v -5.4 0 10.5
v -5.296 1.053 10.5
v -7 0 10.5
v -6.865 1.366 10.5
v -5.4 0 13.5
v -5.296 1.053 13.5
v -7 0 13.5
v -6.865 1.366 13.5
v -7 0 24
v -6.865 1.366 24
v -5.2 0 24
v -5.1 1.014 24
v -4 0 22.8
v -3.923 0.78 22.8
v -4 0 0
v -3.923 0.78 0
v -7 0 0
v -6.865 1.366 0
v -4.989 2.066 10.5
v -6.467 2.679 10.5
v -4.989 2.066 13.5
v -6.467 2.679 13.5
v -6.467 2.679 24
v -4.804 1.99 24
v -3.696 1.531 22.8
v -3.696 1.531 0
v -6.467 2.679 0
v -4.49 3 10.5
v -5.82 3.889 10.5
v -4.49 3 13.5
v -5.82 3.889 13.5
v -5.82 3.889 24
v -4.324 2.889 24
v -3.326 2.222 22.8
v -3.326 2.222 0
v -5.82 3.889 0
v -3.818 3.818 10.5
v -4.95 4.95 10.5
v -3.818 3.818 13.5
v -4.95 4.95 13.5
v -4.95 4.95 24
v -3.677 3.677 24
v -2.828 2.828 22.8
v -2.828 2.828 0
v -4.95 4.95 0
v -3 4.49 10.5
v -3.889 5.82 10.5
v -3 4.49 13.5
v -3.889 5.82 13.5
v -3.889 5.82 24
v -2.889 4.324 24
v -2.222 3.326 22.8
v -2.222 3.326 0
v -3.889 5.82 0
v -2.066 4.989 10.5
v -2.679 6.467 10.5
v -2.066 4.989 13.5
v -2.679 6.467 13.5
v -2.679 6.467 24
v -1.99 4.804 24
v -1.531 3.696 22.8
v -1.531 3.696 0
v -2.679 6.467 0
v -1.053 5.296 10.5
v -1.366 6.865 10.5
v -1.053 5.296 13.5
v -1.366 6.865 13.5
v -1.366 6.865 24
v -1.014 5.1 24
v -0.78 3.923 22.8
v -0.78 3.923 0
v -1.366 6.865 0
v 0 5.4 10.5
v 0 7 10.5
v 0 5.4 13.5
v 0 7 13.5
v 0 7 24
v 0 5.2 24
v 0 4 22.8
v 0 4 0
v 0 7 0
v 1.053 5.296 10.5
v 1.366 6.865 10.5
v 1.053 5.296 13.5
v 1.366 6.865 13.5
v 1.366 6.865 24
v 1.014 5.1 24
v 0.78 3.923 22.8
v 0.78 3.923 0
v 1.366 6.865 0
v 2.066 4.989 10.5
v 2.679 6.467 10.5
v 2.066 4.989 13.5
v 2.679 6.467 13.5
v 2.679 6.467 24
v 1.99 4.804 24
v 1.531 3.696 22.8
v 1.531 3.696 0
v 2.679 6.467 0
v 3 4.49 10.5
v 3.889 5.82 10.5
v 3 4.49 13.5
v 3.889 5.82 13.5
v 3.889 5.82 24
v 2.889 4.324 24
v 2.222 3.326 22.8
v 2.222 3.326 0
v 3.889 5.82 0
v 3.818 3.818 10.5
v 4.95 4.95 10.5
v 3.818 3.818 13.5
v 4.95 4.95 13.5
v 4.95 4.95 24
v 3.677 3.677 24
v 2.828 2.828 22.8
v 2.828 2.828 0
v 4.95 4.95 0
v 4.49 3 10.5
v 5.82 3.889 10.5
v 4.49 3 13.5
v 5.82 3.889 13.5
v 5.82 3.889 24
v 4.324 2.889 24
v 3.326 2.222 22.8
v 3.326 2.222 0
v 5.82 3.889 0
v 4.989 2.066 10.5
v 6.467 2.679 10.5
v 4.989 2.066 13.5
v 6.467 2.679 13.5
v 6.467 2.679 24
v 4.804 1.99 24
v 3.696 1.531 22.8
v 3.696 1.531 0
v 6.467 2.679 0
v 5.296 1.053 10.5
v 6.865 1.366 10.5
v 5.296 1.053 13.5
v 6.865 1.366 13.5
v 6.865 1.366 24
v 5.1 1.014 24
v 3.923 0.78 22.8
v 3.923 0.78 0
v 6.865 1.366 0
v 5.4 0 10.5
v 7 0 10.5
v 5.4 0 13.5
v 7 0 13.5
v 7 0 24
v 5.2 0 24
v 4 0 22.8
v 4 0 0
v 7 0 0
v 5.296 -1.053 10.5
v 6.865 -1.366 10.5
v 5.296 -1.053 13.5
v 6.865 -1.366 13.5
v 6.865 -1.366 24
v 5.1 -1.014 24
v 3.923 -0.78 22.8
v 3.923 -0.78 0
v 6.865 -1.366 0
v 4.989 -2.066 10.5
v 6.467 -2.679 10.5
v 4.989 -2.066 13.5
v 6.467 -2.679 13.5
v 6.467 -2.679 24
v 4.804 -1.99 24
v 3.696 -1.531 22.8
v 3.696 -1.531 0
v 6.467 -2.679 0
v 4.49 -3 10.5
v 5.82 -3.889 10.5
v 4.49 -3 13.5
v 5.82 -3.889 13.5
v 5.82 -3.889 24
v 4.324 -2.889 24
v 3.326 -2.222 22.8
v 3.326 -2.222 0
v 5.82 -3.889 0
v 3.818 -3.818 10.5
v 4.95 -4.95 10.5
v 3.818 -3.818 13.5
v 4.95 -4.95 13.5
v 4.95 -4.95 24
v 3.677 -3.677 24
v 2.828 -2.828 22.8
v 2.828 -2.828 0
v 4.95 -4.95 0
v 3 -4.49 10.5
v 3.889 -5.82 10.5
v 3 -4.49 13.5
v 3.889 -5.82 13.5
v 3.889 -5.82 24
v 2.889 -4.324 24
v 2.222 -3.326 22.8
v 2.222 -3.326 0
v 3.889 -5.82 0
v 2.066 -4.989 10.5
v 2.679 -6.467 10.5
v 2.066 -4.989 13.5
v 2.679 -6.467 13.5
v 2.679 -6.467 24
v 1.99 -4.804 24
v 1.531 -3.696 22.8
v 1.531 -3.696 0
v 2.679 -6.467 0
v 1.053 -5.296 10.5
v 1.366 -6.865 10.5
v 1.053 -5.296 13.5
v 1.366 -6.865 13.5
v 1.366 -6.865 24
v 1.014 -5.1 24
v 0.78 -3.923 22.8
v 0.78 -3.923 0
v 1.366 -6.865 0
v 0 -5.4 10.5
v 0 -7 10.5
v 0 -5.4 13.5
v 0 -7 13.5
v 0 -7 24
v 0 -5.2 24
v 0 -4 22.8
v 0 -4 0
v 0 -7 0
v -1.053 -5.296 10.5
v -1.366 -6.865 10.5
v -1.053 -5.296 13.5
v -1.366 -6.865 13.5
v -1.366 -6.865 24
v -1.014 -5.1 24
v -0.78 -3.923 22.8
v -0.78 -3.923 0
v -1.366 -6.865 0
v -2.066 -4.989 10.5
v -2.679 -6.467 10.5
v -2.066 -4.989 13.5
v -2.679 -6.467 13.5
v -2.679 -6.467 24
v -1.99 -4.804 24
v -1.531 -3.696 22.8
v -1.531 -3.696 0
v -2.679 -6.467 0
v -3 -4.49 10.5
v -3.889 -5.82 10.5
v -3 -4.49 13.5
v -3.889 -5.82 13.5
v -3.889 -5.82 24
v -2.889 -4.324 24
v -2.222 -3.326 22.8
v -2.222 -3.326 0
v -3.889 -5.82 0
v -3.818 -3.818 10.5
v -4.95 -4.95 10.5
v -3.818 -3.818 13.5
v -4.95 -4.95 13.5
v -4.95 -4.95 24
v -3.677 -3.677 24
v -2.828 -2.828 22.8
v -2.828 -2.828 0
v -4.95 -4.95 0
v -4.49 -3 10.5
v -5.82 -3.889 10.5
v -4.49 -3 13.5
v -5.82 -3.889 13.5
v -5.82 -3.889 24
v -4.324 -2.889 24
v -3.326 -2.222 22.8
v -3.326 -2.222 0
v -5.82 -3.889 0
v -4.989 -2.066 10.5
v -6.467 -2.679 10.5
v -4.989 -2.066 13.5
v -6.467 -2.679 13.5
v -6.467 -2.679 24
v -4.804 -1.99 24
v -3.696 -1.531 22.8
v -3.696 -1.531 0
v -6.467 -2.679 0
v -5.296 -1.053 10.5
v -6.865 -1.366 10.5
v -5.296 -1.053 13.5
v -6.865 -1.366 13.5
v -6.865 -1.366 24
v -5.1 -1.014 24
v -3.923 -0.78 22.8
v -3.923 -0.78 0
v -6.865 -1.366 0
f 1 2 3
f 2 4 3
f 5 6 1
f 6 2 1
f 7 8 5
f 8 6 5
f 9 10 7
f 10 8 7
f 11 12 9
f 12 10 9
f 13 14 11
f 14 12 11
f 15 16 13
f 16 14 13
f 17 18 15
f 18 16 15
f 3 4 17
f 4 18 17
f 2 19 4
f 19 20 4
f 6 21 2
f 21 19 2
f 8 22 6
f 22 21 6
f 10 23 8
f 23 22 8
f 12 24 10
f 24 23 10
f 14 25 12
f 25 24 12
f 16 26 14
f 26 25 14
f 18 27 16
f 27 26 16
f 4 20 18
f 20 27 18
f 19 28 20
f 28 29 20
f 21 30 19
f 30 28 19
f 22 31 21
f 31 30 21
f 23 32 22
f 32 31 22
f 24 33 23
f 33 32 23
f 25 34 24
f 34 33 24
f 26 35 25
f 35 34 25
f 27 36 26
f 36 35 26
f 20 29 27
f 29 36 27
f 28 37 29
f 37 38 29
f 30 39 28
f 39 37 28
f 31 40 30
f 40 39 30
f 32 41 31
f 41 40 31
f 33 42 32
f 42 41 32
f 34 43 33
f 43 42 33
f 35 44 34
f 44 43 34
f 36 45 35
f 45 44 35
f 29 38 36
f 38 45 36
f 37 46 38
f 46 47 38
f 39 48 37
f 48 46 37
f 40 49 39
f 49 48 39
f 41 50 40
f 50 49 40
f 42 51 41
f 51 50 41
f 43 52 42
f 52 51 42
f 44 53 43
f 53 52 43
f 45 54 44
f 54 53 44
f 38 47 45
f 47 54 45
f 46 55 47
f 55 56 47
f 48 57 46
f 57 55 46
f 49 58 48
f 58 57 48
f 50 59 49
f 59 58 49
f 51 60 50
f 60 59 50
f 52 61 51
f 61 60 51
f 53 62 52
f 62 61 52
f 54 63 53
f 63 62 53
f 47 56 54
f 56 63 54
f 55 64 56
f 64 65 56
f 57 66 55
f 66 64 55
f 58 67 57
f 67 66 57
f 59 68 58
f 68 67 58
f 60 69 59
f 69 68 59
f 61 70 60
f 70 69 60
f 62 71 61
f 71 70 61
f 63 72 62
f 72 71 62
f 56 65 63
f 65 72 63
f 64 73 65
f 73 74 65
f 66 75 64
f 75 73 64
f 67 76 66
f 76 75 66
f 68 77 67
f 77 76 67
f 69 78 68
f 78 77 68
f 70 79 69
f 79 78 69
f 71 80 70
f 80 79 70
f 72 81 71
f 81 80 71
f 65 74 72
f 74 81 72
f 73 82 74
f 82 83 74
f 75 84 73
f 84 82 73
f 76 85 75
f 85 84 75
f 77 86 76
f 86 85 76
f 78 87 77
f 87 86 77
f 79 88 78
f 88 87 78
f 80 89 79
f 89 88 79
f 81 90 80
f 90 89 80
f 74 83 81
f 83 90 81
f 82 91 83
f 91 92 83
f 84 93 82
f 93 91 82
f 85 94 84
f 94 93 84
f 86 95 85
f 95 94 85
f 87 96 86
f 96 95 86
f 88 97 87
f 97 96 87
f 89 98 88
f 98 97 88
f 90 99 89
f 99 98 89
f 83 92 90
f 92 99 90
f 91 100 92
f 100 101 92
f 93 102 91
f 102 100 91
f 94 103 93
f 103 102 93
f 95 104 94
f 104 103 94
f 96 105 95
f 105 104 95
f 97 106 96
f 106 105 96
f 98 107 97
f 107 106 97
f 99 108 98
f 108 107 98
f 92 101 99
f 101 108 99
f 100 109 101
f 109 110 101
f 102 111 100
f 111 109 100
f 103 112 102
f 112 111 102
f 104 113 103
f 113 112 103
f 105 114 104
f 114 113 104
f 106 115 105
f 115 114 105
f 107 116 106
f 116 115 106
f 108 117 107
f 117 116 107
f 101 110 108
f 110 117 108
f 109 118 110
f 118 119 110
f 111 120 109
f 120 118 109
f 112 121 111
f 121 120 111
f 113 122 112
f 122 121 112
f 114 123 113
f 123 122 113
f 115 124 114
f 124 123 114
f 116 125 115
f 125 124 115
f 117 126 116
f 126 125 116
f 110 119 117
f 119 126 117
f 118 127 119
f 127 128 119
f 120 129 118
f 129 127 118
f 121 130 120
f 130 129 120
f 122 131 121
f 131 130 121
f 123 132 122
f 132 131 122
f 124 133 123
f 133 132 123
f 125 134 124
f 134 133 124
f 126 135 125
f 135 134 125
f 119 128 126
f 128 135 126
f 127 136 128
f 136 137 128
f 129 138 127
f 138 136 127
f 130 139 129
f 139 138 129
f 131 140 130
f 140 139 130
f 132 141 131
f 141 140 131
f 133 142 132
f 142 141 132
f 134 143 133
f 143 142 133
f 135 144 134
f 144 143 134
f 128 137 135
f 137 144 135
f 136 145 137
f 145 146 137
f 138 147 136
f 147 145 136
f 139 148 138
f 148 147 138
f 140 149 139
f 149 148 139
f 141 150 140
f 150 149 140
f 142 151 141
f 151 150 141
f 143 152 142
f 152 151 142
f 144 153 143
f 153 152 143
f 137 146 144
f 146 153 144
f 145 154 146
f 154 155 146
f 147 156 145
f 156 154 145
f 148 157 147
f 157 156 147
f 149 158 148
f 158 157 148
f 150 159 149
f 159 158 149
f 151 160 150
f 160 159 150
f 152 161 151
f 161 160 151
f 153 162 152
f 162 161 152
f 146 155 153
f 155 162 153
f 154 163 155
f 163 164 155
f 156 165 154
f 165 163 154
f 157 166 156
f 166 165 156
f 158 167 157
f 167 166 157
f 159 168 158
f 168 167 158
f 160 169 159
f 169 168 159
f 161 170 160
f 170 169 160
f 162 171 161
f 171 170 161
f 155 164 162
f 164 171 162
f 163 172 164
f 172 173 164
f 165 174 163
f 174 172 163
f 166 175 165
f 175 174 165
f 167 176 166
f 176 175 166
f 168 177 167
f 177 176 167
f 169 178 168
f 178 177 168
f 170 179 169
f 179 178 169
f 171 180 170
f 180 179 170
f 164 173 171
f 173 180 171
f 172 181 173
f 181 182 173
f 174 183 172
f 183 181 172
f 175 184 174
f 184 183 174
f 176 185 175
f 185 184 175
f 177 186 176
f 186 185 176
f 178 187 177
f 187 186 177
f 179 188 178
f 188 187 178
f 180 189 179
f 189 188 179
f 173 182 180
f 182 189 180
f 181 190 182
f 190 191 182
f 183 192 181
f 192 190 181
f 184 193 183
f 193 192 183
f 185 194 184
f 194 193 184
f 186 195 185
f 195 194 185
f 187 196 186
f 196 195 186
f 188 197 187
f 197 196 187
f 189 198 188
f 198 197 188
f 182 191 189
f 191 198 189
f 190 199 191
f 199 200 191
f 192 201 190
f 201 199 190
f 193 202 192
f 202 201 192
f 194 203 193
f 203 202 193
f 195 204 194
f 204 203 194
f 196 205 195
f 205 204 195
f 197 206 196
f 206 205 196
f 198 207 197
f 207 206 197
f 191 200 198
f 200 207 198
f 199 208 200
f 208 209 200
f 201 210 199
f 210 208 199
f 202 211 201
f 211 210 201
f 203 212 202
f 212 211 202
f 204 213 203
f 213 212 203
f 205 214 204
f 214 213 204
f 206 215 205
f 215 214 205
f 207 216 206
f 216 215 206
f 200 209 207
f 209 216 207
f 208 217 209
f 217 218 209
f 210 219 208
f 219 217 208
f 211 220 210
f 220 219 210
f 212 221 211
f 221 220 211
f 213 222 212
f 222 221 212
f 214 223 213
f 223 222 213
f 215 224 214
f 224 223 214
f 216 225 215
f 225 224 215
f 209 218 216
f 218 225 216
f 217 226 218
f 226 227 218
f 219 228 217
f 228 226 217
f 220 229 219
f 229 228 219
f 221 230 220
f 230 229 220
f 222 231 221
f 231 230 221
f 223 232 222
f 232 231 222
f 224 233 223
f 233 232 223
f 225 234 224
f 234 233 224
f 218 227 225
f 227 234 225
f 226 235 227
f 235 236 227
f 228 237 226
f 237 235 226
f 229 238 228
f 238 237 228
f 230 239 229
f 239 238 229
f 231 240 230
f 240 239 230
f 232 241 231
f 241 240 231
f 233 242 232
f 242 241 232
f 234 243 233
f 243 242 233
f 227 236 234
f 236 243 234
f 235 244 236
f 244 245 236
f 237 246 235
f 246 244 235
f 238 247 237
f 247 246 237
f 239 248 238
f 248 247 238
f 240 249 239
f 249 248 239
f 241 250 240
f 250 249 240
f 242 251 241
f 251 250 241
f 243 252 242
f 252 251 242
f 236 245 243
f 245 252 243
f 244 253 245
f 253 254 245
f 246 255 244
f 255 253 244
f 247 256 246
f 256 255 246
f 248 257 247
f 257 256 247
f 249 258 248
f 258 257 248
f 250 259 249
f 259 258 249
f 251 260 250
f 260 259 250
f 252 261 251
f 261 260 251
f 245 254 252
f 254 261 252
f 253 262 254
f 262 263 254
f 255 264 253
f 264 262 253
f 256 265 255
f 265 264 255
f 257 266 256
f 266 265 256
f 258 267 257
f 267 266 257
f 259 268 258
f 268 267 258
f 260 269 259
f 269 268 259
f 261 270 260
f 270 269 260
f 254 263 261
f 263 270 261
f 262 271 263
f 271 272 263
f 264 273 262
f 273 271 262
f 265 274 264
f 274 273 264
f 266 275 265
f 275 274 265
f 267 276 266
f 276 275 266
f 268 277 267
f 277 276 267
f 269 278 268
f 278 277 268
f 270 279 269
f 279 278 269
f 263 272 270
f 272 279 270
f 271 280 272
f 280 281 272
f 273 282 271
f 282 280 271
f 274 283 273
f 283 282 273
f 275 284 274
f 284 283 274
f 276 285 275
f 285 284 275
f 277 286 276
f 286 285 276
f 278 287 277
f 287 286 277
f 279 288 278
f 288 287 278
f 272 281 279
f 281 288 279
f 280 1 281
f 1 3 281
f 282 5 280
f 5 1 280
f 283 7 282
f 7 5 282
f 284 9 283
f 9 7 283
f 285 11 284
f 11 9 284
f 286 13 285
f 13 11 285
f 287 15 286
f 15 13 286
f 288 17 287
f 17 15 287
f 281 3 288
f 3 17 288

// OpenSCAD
$fn = 32;

// ----------------------------------------------------------------------
// Grooved revolve: thread_relief, bore R4
// ----------------------------------------------------------------------

// --- parameters (mm) ---
bore_r = 4;               // bore radius
outer_r = 7;              // outer radius of the body
total_h = 24;             // overall height, Z
wall = 3;                 // radial wall thickness
groove_w = 3;             // groove width
groove_d = 1.6;           // groove depth
grooves = 1;              // number of outer grooves
relief = 1.2;             // thread relief leg at the bore mouth
relief_angle = 45;        // thread relief chamfer angle, degrees

bbox_x = 2 * outer_r;  // full diameter
bore_d = 2 * bore_r;  // bore diameter
body_d = 2 * outer_r;  // body diameter
revolve_angle = 360;  // full turn around the Z axis

profile = [[4, 0], [7, 0], [7, 10.5], [5.4, 10.5], [5.4, 13.5], [7, 13.5], [7, 24], [5.2, 24], [4, 22.8]];  // primary outline, 9 points, counter clockwise

// --- the one profile operation ---
rotate_extrude(angle = revolve_angle) polygon(points = profile);
